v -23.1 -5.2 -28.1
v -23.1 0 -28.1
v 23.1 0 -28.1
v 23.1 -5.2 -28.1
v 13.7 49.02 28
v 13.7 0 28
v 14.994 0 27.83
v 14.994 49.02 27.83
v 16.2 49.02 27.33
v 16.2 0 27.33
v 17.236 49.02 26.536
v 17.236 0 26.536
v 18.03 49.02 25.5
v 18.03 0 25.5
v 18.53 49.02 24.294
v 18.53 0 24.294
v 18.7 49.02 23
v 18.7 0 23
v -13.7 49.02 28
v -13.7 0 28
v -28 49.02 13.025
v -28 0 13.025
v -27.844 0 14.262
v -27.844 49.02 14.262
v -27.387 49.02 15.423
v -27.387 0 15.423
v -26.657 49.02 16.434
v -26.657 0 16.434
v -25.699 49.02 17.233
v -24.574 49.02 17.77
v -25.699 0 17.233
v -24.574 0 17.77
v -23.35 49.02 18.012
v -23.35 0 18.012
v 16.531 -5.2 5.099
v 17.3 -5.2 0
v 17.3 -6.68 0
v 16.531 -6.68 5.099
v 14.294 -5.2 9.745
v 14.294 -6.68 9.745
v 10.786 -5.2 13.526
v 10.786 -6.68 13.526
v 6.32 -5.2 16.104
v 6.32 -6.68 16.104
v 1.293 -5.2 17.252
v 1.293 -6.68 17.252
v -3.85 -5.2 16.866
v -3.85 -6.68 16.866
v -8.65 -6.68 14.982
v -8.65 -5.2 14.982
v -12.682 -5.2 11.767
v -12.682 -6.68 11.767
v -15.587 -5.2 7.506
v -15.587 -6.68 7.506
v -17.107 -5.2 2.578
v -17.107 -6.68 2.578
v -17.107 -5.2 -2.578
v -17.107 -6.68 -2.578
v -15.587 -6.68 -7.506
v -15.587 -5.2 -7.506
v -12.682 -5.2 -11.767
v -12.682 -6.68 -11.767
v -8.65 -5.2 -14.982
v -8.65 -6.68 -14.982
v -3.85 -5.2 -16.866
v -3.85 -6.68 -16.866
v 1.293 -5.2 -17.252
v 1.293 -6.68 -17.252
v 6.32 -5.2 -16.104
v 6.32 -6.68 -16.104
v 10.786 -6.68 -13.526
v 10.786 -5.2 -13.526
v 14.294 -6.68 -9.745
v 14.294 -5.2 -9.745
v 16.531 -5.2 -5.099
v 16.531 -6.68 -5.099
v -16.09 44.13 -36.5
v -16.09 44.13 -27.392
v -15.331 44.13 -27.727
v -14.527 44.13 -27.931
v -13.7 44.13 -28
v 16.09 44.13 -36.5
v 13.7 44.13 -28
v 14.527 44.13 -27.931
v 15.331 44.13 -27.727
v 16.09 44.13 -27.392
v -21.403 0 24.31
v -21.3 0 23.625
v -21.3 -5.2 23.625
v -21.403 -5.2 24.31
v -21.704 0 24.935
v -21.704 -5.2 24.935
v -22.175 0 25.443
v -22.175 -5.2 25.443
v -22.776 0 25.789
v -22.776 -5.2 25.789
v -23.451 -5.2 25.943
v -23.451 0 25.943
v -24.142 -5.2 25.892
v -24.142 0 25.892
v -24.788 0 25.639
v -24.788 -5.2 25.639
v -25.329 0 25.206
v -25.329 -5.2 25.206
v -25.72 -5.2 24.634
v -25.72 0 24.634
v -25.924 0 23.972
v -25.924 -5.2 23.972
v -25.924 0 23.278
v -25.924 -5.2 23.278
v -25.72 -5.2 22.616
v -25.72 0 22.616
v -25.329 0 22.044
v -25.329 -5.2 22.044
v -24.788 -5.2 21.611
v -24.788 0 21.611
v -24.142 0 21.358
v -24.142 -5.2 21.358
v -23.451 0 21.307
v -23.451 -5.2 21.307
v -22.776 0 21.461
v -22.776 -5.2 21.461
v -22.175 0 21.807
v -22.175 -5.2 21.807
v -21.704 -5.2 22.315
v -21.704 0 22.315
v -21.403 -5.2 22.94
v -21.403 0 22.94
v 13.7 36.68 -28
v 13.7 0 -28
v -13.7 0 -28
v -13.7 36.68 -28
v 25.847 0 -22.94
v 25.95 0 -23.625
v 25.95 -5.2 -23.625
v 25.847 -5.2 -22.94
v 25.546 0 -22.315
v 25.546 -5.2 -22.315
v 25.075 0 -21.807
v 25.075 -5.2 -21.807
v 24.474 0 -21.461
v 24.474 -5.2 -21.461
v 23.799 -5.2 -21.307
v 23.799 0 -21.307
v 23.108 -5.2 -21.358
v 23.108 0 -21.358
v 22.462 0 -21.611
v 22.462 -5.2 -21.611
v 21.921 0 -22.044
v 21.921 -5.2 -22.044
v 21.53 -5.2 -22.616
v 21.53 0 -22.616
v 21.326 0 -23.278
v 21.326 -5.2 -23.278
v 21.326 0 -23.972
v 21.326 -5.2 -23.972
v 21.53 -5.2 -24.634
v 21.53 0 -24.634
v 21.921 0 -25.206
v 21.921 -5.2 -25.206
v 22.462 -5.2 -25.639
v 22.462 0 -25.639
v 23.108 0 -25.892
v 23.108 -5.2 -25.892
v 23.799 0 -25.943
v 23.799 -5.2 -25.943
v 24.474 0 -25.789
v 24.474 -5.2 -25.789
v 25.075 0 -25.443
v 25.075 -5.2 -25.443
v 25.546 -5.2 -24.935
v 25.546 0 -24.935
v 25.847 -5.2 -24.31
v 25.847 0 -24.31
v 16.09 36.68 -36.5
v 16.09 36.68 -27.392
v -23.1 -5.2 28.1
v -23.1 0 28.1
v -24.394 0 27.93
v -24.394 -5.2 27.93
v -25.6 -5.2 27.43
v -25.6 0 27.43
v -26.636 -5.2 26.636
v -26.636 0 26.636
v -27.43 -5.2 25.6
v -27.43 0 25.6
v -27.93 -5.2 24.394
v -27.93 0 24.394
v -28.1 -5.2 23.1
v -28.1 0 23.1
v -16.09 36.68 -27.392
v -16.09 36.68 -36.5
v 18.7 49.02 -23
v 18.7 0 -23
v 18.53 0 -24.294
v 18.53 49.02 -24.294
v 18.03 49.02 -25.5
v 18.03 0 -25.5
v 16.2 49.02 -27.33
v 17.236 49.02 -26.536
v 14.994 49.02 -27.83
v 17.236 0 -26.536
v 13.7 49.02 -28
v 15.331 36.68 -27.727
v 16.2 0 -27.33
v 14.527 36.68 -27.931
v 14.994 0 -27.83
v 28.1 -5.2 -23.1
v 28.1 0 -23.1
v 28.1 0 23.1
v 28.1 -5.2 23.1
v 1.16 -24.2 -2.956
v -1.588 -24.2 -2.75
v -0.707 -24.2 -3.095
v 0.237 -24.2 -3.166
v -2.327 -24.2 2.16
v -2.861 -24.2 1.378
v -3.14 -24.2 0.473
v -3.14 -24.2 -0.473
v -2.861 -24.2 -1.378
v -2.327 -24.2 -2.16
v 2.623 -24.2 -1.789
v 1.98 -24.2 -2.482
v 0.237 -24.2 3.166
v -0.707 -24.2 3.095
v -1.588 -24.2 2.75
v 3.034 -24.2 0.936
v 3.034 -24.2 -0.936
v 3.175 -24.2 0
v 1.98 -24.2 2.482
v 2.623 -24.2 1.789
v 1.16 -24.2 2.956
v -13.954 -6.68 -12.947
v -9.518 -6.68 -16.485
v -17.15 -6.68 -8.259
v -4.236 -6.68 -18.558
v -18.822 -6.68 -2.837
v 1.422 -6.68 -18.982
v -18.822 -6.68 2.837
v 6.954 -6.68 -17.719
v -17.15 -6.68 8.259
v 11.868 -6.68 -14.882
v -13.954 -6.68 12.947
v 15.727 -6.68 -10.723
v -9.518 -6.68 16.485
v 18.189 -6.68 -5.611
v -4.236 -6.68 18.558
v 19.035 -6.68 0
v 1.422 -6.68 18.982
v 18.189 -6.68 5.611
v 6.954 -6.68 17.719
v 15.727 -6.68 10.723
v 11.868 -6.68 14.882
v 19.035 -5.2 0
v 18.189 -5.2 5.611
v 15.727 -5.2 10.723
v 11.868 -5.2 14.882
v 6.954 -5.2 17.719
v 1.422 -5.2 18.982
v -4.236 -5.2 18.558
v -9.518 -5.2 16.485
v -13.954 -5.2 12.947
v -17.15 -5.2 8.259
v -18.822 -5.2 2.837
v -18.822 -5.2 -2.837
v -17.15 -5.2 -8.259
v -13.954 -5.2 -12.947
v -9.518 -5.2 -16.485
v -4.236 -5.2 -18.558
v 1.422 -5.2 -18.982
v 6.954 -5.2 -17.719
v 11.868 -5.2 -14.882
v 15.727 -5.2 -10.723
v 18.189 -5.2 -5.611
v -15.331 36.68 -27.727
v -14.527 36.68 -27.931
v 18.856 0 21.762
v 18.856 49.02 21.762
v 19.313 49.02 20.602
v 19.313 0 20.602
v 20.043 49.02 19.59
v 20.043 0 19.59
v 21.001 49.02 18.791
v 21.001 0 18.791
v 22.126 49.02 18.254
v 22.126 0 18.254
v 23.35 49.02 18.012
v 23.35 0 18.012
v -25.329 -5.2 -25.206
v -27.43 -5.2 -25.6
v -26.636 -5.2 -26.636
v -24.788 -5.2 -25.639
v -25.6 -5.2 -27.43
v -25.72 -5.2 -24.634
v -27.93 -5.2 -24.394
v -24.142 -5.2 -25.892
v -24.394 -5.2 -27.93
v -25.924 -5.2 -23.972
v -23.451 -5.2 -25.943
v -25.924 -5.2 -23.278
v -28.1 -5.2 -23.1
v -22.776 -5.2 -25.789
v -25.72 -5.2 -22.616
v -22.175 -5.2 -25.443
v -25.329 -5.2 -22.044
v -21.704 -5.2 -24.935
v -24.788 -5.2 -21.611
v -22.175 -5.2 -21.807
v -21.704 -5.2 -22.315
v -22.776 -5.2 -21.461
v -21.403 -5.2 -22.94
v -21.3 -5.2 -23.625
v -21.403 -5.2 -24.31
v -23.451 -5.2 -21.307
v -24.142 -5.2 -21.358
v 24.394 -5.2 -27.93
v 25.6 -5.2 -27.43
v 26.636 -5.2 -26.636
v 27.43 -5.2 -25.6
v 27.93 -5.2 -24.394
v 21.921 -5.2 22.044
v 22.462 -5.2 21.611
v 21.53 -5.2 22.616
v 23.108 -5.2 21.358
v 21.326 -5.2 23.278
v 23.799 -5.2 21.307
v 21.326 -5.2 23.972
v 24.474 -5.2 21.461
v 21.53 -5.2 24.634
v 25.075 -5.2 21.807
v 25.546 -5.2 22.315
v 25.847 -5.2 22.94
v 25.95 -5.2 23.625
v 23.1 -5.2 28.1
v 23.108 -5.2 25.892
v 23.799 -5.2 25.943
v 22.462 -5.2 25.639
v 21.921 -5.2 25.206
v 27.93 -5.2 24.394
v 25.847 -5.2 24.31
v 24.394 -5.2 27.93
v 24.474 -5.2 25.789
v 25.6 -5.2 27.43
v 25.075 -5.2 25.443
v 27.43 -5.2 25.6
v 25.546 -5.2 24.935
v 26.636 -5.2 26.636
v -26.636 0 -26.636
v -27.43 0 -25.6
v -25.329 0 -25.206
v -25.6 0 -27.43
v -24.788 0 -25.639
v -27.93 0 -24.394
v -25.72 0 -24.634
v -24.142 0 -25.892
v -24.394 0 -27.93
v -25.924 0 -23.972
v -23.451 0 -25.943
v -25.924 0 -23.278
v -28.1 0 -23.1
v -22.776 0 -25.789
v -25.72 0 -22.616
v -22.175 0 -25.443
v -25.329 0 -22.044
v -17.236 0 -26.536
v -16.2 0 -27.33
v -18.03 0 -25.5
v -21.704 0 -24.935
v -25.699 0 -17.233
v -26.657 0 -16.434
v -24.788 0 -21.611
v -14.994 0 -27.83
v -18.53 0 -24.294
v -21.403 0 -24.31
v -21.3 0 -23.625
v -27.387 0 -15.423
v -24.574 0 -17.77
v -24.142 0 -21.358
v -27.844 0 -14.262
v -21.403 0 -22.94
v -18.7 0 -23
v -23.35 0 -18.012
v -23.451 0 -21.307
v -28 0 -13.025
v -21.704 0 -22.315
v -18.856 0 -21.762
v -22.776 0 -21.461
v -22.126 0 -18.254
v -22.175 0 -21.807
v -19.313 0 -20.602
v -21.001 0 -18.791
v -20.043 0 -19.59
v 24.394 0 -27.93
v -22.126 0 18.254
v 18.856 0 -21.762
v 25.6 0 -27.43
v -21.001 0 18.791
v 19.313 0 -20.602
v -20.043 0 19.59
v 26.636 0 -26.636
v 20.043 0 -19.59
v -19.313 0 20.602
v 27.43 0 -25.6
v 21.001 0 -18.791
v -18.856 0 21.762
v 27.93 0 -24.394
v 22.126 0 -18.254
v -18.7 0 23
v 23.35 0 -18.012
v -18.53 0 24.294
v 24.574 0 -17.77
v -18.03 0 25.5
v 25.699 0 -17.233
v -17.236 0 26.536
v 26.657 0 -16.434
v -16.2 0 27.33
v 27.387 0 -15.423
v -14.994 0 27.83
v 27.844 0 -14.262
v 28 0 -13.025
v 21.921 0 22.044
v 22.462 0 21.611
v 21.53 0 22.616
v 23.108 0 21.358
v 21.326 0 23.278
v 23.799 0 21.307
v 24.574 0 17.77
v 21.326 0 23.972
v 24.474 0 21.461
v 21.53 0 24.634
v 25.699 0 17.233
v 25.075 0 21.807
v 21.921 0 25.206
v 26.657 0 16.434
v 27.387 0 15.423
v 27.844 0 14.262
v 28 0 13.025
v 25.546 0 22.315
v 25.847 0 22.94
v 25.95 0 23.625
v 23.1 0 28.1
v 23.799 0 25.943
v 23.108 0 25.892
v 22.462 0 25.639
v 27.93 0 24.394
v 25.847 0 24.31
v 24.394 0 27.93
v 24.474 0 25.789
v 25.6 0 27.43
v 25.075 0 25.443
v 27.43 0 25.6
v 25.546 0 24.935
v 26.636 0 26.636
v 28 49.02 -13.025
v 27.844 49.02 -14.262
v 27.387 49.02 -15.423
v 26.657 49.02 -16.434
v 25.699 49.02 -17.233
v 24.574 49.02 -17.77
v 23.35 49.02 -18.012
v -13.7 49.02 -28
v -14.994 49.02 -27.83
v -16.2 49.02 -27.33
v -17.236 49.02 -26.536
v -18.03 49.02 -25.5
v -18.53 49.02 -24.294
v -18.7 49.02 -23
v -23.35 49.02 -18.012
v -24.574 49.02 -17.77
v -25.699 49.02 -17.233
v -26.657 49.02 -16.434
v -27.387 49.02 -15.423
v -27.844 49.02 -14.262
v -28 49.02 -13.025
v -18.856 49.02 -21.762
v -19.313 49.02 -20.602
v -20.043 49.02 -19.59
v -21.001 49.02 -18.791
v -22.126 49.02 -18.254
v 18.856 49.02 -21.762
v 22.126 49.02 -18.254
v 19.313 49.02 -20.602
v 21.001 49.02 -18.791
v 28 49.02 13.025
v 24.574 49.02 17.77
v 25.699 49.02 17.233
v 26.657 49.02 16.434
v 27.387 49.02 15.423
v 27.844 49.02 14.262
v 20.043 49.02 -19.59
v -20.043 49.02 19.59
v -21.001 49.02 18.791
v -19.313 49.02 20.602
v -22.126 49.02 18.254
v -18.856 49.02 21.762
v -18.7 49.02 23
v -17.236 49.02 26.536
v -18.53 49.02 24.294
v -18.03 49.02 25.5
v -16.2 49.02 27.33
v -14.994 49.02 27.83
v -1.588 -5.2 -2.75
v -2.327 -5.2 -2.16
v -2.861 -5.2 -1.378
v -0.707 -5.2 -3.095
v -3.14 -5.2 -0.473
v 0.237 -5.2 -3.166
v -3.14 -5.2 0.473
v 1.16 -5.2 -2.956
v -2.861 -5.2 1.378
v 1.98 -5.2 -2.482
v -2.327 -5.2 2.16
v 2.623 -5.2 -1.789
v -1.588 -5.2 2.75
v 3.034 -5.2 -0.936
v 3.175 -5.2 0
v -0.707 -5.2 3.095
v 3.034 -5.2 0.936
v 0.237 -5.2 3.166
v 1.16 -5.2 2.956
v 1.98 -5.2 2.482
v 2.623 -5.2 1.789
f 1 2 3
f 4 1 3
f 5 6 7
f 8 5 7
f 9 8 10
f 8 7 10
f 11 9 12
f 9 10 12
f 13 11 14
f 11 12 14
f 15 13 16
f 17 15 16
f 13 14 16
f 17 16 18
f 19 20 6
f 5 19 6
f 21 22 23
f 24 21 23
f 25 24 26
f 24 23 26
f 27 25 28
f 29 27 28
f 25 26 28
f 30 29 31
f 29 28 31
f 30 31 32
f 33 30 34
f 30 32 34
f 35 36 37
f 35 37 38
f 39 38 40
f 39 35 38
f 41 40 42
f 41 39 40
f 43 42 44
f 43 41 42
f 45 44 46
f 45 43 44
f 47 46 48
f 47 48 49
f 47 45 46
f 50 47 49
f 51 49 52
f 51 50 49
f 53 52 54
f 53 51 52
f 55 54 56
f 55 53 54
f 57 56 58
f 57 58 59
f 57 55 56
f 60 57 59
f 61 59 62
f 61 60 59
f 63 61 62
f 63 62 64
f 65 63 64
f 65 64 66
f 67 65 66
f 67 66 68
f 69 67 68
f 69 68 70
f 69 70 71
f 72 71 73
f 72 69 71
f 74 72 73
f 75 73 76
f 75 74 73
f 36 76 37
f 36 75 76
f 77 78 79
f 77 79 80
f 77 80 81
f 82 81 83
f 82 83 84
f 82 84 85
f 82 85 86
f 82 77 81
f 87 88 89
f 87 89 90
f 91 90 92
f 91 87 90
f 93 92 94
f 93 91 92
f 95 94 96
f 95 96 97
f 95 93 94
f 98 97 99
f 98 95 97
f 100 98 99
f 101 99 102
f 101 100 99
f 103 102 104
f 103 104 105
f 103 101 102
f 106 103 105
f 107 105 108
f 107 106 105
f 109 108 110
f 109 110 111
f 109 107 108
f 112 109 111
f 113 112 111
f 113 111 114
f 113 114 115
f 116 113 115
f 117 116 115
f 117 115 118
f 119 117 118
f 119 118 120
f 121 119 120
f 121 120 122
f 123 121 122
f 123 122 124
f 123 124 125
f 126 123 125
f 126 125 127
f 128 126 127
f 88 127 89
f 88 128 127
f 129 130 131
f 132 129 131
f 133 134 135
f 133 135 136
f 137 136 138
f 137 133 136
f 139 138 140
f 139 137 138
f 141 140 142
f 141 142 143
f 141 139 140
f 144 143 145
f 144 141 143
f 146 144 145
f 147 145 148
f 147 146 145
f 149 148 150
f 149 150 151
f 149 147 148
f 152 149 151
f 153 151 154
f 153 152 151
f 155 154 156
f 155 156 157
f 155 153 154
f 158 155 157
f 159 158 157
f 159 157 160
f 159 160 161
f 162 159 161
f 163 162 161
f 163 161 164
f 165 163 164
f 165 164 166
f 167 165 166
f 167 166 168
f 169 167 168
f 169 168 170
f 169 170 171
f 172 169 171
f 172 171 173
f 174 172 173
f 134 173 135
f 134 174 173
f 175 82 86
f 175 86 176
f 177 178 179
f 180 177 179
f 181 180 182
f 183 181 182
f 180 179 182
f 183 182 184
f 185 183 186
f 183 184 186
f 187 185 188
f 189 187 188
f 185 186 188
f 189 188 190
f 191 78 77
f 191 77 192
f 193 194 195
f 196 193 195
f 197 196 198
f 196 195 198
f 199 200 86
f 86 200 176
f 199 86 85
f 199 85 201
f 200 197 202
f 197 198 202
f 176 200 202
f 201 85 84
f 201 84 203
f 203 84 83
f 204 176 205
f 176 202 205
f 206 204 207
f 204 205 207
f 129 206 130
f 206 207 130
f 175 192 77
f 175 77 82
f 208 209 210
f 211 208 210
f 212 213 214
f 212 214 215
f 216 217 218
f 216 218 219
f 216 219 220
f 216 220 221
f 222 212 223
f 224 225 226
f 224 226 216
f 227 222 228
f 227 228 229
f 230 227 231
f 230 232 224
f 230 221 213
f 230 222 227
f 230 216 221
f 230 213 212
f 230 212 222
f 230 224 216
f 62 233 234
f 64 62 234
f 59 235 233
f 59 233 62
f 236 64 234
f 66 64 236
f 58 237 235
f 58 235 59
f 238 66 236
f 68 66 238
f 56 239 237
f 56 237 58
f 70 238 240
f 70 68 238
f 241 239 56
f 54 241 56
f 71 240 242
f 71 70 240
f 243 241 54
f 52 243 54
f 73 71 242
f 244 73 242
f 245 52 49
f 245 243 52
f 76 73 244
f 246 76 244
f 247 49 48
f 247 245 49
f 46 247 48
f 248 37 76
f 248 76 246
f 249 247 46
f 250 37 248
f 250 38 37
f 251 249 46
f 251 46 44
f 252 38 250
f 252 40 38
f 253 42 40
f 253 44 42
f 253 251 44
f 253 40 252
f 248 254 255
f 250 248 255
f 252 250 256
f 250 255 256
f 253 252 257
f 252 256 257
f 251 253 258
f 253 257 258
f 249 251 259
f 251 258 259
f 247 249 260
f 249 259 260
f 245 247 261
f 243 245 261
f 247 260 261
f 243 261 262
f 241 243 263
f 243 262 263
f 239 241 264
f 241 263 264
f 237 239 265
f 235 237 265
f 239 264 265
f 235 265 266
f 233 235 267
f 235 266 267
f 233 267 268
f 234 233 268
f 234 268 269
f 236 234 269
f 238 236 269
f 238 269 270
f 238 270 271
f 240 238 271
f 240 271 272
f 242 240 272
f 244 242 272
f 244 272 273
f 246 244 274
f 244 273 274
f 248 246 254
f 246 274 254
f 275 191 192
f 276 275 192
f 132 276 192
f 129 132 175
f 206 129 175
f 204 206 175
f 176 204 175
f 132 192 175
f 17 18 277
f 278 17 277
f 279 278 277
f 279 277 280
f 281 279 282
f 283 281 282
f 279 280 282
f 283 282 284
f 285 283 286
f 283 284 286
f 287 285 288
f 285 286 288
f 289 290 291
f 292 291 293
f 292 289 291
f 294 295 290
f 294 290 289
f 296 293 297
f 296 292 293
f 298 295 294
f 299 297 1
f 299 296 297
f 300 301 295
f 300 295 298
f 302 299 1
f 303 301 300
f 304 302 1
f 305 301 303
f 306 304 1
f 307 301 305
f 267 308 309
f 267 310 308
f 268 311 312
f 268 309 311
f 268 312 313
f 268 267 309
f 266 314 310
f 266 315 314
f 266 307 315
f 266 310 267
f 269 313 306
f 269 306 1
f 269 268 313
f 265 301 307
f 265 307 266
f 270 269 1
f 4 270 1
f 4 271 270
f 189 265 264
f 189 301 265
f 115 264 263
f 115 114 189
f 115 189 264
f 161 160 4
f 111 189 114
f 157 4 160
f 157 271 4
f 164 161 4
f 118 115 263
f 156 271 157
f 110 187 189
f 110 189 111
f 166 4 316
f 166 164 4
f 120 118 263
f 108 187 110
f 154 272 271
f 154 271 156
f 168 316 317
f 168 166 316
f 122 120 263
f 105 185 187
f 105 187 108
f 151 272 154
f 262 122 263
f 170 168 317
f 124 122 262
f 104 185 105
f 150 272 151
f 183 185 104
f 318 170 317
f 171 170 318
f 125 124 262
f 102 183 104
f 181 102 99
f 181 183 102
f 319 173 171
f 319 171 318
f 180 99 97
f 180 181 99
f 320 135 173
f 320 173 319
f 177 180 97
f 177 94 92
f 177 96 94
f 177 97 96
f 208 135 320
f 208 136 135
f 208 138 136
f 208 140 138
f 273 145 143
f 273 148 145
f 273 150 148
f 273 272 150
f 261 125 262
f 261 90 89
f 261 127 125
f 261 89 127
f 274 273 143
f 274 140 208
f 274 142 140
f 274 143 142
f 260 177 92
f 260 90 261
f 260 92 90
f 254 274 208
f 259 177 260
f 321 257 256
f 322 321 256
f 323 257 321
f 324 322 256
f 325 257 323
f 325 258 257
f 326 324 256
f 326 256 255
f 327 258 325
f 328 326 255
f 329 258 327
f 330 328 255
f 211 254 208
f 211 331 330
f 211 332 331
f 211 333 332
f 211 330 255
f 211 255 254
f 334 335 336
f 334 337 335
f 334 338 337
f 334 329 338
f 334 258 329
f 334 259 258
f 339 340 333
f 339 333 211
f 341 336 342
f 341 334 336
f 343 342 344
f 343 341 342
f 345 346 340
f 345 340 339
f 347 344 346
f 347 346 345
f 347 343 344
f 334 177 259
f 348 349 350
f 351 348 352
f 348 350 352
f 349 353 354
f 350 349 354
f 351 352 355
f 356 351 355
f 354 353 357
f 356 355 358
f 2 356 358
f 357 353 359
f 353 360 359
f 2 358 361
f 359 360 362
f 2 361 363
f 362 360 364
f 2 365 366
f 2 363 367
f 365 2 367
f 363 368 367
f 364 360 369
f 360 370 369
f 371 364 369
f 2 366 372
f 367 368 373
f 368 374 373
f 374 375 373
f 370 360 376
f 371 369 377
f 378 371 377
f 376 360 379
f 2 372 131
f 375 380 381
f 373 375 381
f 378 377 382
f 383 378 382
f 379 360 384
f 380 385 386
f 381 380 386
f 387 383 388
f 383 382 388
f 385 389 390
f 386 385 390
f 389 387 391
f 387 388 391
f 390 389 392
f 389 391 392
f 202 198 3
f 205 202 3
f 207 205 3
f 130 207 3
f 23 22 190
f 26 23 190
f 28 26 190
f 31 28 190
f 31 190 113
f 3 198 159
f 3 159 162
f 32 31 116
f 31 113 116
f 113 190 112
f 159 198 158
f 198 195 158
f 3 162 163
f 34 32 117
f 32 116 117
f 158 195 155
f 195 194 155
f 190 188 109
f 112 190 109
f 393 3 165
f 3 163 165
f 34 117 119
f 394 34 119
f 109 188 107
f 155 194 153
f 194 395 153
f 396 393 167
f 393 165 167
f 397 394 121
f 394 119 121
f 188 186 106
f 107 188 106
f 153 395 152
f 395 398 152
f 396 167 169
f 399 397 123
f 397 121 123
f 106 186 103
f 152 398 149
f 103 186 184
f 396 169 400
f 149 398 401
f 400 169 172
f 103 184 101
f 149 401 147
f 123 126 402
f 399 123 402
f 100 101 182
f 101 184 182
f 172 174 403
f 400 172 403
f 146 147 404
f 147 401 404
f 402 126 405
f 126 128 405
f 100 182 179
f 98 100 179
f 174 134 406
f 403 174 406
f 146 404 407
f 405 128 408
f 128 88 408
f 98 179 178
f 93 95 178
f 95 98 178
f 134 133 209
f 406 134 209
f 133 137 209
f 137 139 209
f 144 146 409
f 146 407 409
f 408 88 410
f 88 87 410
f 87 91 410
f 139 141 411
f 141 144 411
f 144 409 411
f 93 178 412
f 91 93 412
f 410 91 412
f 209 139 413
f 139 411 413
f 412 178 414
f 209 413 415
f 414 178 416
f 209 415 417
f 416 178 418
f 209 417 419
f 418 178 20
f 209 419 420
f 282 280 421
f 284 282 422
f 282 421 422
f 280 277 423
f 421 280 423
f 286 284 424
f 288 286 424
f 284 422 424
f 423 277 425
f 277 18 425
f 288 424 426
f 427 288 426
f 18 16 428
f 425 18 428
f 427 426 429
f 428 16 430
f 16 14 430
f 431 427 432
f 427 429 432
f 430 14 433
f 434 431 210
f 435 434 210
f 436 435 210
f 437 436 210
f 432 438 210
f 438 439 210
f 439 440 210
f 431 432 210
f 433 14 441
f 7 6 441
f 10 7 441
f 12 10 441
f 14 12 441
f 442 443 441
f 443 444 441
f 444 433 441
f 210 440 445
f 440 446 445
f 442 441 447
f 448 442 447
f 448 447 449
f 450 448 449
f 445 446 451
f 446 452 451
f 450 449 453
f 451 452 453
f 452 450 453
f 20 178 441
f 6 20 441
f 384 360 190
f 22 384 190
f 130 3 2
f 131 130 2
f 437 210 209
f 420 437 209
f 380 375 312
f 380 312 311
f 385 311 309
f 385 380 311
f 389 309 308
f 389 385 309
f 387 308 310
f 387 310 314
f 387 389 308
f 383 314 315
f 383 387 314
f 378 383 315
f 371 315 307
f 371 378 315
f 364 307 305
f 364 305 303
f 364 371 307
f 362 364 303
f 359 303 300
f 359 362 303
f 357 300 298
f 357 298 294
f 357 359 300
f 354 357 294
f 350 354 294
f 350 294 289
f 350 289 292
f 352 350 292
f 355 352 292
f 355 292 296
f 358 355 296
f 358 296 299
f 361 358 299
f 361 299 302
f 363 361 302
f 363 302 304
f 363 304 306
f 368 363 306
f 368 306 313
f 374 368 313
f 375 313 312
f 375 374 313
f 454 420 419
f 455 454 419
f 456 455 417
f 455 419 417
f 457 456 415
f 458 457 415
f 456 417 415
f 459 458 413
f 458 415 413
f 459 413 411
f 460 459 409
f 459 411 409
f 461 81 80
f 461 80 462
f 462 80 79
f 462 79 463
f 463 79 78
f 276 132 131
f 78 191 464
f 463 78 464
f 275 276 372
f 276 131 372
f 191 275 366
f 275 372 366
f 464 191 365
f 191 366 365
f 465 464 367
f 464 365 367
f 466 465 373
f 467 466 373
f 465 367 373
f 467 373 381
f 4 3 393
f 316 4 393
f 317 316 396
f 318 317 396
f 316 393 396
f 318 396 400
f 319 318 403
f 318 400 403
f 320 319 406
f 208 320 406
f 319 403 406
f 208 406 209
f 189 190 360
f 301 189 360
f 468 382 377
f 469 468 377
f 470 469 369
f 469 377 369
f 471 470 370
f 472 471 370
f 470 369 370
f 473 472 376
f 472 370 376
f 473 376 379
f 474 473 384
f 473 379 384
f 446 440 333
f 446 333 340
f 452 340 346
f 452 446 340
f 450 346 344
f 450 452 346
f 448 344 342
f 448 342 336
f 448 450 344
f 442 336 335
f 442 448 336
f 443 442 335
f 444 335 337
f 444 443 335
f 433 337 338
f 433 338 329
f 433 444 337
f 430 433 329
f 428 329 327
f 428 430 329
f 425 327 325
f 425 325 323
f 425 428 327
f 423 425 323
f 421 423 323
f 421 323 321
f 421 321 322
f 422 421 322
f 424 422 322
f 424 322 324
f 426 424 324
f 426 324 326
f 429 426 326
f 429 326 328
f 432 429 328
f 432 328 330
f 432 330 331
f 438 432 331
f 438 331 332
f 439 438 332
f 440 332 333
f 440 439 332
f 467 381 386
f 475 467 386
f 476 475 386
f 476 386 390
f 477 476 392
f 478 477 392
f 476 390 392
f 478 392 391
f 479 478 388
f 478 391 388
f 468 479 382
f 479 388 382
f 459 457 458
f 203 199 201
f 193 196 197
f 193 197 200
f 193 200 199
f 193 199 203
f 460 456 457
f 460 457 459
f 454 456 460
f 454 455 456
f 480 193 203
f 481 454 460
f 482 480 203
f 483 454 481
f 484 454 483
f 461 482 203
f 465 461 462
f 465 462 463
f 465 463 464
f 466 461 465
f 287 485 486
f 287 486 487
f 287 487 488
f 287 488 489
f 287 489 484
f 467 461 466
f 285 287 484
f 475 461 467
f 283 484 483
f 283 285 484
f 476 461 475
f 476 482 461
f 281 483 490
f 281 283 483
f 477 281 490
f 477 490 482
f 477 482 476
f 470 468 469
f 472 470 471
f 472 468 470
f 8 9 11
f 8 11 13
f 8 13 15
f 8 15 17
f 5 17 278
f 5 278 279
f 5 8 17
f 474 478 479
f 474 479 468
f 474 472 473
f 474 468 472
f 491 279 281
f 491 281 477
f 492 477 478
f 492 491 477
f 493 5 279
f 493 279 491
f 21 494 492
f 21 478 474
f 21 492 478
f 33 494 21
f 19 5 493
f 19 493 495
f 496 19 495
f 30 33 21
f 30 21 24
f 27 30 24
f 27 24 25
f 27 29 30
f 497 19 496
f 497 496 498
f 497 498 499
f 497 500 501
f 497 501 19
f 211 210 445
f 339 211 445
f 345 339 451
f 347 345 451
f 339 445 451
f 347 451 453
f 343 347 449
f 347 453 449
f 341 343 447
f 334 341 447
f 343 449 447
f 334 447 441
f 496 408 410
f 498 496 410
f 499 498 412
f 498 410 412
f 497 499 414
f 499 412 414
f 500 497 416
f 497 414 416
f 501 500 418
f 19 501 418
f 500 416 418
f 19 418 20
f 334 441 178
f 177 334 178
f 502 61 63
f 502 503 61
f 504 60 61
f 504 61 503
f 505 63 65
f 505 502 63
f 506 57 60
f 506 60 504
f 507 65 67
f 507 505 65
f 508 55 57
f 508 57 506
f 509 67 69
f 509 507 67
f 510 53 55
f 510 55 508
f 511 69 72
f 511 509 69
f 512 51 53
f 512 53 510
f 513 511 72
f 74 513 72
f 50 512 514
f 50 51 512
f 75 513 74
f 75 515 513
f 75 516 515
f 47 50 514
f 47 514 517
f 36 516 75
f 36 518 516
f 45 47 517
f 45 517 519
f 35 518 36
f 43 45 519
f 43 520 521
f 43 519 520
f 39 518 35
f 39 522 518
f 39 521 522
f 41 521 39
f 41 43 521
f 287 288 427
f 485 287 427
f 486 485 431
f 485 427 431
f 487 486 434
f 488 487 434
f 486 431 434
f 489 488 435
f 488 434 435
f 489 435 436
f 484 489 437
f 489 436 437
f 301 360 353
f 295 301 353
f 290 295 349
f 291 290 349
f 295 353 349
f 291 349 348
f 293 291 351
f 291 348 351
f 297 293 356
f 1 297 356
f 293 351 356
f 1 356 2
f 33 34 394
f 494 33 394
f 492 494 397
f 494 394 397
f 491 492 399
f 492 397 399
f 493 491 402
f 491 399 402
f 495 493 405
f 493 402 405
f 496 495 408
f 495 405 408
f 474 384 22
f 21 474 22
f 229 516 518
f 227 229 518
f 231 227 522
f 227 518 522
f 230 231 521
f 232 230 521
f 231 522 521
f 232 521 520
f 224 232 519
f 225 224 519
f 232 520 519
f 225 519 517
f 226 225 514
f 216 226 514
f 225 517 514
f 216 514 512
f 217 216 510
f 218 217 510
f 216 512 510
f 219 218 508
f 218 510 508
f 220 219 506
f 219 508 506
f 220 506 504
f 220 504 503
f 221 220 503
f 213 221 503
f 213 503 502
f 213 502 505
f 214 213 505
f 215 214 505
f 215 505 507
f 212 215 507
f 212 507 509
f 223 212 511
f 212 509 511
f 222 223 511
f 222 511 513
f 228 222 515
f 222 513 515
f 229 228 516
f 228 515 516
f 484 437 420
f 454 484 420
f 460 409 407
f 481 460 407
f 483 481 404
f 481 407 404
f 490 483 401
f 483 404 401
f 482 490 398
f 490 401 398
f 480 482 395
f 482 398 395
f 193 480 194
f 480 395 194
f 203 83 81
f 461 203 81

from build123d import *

# Parameters (mm, degrees)
F0_R     = 2.325
F1_DEPTH = 5.2
F2_R     = 19.035
F2_R_2   = 17.3
F3_DEPTH = 1.48
F6_DEPTH = 49.02
F4_R     = 3.175
F7_DEPTH = 19
F8_W     = 32.18
F8_H     = 7.45
F9_DEPTH = 8.5


with BuildPart() as f1:
    # F0 (on Front) → F1 (new body)
    with BuildSketch(Plane.XZ):
        with BuildLine():
            ThreePointArc((28.1, 23.1), (26.635534, 26.635534), (23.1, 28.1))
            Line((23.1, 28.1), (-23.1, 28.1))
            ThreePointArc((-23.1, 28.1), (-26.635534, 26.635534), (-28.1, 23.1))
            Line((-28.1, 23.1), (-28.1, -23.1))
            ThreePointArc((-28.1, -23.1), (-26.635534, -26.635534), (-23.1, -28.1))
            Line((-23.1, -28.1), (23.1, -28.1))
            ThreePointArc((23.1, -28.1), (26.635534, -26.635534), (28.1, -23.1))
            Line((28.1, -23.1), (28.1, 23.1))
        make_face()
        with Locations((-23.625, -23.625)):
            Circle(F0_R, mode=Mode.SUBTRACT)
        with Locations((23.625, -23.625)):
            Circle(F0_R, mode=Mode.SUBTRACT)
        with Locations((-23.625, 23.625)):
            Circle(F0_R, mode=Mode.SUBTRACT)
        with Locations((23.625, 23.625)):
            Circle(F0_R, mode=Mode.SUBTRACT)
    extrude(amount=F1_DEPTH)

    # F2 (on face) → F3 (join)
    with BuildSketch(Plane.XZ.offset(5.2)):
        Circle(F2_R)
        Circle(F2_R_2, mode=Mode.SUBTRACT)
    extrude(amount=F3_DEPTH)

    # F5 (on face) → F6 (join)
    with BuildSketch(Plane(origin=(0, 0, 0), x_dir=(-1, 0, 0), z_dir=(0, 1, 0))):
        with BuildLine():
            Line((13.7, 28), (-13.7, 28))
            ThreePointArc((-13.7, 28), (-17.235534, 26.535534), (-18.7, 23))
            ThreePointArc((-18.7, 23), (-20.042815, 19.590455), (-23.35, 18.012265))
            ThreePointArc((-23.35, 18.012265), (-26.657185, 16.434076), (-28, 13.02453))
            Line((-28, 13.02453), (-28, -13.02453))
            ThreePointArc((-28, -13.02453), (-26.657185, -16.434076), (-23.35, -18.012265))
            ThreePointArc((-23.35, -18.012265), (-20.042815, -19.590455), (-18.7, -23))
            ThreePointArc((-18.7, -23), (-17.235534, -26.535534), (-13.7, -28))
            Line((-13.7, -28), (13.7, -28))
            ThreePointArc((13.7, -28), (17.235534, -26.535534), (18.7, -23))
            ThreePointArc((18.7, -23), (20.042815, -19.590455), (23.35, -18.012265))
            ThreePointArc((23.35, -18.012265), (26.657185, -16.434076), (28, -13.02453))
            Line((28, -13.02453), (28, 13.02453))
            ThreePointArc((28, 13.02453), (26.657185, 16.434076), (23.35, 18.012265))
            ThreePointArc((23.35, 18.012265), (20.042815, 19.590455), (18.7, 23))
            ThreePointArc((18.7, 23), (17.235534, 26.535534), (13.7, 28))
        make_face()
    extrude(amount=F6_DEPTH)

    # F4 (on face) → F7 (join)
    with BuildSketch(Plane.XZ.offset(5.2)):
        Circle(F4_R)
    extrude(amount=F7_DEPTH)

    # F8 (on face) → F9 (join, symmetric)
    with BuildSketch(Plane(origin=(0, 0, -28), x_dir=(1, 0, 0), z_dir=(0, 0, -1))):
        with Locations((0, -40.405)):
            Rectangle(F8_W, F8_H)
    extrude(amount=F9_DEPTH, both=True)


solid = f1.part
